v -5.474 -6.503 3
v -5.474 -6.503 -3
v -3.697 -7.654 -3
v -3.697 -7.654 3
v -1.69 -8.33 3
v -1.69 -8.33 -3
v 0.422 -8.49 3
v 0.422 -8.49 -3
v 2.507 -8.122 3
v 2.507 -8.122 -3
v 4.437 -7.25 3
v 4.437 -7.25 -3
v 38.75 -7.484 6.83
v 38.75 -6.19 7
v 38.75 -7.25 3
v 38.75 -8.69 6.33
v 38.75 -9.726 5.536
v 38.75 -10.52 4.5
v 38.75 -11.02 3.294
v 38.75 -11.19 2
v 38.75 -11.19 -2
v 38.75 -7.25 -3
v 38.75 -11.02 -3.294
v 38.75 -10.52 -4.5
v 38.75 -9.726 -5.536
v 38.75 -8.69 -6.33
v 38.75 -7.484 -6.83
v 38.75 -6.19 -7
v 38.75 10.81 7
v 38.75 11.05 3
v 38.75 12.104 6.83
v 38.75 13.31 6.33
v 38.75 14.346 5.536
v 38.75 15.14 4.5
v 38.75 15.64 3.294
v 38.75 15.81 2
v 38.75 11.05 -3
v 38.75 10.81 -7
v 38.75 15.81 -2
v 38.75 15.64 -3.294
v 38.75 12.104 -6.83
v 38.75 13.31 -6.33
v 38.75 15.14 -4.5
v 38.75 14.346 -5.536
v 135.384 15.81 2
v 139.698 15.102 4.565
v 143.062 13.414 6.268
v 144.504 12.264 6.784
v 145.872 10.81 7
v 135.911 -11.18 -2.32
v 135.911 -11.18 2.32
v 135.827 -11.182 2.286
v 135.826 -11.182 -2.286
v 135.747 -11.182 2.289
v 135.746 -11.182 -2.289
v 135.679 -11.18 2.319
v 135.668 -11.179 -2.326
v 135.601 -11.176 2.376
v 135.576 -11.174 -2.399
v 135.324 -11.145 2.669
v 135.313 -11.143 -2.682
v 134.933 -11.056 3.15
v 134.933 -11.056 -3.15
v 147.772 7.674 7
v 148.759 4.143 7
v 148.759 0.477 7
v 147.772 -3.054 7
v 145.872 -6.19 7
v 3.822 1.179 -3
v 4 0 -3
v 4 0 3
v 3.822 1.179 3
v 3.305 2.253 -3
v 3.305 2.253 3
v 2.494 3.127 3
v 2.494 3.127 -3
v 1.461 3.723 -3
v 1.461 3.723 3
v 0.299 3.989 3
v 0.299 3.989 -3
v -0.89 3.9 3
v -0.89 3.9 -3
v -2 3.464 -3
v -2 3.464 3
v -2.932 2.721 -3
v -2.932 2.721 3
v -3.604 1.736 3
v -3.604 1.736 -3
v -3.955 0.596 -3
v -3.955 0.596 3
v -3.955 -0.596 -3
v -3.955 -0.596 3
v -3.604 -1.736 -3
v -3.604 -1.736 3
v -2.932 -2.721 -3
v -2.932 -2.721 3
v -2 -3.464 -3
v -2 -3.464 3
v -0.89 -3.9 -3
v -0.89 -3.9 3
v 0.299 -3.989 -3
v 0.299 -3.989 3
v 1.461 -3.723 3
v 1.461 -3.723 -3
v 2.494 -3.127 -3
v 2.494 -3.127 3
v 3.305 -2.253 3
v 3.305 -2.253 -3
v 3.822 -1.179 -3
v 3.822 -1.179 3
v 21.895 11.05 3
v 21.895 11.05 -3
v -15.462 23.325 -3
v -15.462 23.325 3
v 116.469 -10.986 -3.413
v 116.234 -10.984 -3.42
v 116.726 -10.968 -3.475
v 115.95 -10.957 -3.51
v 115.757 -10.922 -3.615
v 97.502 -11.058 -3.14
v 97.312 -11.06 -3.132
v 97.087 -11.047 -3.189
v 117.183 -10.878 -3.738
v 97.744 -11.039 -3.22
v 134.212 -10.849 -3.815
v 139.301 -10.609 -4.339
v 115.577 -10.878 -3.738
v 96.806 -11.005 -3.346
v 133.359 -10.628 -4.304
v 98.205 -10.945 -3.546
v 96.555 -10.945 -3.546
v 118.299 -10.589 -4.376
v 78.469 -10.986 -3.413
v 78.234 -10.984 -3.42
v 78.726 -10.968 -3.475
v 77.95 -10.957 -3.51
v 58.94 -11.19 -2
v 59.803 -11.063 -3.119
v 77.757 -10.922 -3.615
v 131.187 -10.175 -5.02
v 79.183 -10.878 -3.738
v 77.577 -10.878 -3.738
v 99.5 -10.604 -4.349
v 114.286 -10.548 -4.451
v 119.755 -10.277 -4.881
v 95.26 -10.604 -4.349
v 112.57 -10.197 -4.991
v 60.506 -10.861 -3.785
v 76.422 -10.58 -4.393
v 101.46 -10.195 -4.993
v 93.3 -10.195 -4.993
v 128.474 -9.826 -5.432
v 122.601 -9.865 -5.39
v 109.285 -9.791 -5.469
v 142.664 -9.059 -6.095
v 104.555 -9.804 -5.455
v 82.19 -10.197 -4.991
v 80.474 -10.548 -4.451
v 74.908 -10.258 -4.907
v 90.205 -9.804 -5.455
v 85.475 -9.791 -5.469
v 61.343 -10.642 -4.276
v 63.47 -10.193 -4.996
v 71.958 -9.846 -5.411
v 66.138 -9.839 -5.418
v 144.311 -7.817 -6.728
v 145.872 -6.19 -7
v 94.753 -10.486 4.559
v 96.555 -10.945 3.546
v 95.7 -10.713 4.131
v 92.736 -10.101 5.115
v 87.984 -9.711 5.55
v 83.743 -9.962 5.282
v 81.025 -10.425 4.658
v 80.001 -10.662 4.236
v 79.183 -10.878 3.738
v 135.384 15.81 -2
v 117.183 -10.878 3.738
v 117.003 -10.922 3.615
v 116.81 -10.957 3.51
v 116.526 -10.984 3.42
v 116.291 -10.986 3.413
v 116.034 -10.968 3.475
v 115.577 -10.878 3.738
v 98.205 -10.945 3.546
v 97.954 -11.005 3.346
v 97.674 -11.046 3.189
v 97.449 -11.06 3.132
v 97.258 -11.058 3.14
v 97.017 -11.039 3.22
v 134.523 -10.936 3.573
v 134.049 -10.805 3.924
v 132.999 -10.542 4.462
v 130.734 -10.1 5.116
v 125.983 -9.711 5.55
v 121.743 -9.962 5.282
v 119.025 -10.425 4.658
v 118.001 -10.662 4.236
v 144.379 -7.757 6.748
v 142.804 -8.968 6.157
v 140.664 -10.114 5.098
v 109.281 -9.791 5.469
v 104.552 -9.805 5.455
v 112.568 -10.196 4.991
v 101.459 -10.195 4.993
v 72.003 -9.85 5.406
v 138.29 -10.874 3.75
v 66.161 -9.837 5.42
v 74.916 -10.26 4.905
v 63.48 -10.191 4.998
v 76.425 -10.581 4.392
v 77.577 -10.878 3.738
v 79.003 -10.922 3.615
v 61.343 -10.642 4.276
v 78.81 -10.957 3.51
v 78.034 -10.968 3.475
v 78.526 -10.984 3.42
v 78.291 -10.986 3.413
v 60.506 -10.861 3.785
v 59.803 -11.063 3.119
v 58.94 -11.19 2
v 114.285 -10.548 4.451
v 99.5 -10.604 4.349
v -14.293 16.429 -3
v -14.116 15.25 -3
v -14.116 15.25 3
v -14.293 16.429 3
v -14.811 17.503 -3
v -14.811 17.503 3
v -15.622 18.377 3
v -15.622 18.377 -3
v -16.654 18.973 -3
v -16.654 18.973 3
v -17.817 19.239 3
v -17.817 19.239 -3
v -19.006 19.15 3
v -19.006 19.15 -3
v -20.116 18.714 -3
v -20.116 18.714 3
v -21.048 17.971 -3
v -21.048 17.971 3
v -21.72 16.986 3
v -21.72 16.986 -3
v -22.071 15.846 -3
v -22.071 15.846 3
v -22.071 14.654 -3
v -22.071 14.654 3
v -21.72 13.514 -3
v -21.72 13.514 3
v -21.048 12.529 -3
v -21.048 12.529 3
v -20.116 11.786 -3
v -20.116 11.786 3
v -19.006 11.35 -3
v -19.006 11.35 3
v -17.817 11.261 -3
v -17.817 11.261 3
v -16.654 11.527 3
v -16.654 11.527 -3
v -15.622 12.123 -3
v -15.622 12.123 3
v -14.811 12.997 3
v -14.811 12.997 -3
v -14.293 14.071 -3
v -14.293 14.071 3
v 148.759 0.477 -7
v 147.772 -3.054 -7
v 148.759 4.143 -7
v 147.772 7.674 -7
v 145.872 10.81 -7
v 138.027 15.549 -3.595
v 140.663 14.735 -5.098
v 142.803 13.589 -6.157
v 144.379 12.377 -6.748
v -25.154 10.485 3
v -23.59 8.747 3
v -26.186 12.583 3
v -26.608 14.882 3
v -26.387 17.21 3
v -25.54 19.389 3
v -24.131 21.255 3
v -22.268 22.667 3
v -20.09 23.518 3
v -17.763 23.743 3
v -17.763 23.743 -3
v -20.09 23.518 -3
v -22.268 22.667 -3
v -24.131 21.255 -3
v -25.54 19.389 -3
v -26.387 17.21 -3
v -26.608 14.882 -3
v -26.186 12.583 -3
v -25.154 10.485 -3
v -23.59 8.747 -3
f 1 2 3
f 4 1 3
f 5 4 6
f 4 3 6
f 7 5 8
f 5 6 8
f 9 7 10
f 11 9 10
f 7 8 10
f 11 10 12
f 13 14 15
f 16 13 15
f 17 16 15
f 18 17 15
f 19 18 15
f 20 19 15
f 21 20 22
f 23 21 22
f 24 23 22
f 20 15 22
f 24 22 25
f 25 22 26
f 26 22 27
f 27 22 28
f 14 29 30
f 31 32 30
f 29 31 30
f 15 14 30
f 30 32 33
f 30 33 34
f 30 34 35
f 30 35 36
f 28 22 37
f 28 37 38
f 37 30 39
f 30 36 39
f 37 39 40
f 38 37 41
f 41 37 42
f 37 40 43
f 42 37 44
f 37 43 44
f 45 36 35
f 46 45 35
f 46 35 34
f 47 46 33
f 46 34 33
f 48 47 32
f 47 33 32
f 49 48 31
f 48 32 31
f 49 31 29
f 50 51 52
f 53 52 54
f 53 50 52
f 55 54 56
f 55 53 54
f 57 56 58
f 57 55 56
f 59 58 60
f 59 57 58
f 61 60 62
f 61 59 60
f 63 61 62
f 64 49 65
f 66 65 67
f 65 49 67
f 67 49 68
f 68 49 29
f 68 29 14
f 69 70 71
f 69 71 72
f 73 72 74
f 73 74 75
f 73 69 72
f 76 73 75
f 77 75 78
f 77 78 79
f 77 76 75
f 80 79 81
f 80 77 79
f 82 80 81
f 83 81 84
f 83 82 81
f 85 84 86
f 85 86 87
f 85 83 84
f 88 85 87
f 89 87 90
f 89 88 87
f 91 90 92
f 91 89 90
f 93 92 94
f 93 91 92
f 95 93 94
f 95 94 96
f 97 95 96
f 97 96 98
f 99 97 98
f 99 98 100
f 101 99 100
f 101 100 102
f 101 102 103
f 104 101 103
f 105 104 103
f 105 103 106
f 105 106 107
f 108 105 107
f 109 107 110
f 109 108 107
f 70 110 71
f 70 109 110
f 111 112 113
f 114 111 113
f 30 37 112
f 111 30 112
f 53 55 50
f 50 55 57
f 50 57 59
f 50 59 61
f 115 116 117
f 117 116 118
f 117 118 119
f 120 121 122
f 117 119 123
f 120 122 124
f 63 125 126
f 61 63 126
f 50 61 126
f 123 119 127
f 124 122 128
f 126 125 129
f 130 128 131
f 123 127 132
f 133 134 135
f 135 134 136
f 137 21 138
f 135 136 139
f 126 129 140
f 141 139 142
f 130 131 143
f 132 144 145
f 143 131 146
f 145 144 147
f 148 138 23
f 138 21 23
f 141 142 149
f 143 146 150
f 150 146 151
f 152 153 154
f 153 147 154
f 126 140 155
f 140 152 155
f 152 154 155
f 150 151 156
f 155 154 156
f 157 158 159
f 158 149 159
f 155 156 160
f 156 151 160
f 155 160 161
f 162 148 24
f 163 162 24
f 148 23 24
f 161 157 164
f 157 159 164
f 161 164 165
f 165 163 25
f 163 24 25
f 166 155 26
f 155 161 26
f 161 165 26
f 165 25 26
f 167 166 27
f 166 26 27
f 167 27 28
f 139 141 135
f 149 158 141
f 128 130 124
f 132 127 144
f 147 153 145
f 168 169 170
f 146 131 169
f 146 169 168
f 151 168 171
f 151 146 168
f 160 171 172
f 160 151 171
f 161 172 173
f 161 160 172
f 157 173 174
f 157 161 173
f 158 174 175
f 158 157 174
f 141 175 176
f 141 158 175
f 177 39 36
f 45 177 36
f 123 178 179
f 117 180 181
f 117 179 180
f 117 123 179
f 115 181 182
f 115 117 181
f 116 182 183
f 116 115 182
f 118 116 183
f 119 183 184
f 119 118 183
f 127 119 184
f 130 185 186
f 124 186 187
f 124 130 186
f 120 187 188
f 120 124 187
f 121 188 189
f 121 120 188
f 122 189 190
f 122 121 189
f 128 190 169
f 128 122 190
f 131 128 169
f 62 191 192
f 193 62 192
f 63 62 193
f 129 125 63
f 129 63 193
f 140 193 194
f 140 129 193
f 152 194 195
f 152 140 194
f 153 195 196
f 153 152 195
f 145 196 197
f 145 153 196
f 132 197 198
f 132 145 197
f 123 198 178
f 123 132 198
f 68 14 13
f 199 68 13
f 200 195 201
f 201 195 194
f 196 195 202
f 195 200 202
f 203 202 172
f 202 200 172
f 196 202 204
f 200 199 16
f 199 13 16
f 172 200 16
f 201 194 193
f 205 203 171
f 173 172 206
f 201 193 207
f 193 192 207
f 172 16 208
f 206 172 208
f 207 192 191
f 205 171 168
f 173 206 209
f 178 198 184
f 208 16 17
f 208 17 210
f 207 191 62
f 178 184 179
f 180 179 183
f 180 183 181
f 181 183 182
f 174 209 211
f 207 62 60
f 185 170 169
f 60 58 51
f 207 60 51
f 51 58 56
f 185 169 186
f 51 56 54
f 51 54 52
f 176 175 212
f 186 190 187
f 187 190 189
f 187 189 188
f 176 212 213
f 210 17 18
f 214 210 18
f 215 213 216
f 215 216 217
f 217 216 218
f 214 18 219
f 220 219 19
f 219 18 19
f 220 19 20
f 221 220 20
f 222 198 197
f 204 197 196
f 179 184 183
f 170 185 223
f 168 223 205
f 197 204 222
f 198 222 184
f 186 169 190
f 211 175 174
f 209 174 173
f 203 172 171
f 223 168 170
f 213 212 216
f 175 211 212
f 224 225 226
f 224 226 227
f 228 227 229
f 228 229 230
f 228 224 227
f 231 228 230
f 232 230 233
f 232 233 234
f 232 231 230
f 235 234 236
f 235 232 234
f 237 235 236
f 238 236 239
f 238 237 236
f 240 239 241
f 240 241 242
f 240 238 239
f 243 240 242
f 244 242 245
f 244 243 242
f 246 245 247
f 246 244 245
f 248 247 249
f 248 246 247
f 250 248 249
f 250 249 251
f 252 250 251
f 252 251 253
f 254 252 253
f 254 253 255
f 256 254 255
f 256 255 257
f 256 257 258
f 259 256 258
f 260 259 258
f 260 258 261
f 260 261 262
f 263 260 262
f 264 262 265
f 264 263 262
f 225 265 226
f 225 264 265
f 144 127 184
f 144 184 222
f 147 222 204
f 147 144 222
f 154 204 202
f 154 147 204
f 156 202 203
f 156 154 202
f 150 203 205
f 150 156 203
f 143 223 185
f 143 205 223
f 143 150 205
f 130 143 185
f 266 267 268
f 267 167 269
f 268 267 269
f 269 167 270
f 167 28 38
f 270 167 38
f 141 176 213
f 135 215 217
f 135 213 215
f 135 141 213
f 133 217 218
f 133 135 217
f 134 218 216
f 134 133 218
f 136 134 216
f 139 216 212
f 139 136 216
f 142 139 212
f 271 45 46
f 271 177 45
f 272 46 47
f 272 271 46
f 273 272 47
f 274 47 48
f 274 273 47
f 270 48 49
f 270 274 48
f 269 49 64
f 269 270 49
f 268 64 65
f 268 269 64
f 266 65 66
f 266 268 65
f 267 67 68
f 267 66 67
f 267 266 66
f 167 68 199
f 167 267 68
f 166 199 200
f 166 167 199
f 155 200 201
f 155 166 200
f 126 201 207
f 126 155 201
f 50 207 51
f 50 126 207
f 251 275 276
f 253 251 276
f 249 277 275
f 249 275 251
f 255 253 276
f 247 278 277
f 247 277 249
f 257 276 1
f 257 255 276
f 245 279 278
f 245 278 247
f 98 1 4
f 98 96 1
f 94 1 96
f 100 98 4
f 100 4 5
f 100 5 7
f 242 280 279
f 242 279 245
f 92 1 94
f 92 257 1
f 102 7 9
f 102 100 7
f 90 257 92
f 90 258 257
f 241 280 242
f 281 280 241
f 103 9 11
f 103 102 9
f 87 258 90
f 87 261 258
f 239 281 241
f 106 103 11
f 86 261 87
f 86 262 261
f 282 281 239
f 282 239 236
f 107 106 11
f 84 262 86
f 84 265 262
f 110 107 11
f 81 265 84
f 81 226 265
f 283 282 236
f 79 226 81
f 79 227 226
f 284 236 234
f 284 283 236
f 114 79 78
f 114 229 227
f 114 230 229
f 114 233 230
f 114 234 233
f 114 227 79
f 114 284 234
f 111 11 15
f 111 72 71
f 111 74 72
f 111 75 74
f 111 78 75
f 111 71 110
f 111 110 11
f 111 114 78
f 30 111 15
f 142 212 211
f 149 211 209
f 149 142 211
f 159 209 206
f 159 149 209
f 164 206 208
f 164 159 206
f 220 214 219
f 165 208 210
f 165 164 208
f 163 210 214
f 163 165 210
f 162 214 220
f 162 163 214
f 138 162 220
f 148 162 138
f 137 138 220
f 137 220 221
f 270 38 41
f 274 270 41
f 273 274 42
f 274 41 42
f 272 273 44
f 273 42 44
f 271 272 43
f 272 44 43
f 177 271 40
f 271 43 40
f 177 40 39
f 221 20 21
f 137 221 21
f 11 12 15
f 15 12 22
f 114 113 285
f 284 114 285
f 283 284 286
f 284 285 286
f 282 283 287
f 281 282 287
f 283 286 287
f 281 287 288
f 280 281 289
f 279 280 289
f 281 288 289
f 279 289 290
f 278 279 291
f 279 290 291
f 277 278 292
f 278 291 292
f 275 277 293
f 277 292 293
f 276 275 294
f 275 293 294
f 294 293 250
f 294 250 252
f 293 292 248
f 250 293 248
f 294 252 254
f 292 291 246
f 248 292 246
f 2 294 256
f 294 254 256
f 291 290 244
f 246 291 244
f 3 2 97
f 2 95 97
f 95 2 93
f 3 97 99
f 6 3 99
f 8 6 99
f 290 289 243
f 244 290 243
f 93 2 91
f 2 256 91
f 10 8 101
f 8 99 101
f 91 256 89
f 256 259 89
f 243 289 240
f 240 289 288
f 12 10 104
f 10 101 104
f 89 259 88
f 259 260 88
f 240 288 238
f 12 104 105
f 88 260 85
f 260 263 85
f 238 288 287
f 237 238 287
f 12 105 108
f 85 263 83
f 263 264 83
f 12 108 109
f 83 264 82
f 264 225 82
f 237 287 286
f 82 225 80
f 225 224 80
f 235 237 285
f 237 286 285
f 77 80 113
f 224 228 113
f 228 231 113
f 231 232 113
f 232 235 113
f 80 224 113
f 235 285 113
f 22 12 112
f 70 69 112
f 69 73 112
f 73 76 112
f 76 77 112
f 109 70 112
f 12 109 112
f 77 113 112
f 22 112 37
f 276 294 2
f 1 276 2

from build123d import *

# Parameters (mm, degrees)
EXTRUDE_1_DEPTH          = 3
EXTRUDE_1_DEPTH_BACK     = 3
SKETCH_1_R               = 4
EXTRUDE_2_DEPTH          = 110.134
CUT_EXTRUDE_1_DEPTH      = 7
CUT_EXTRUDE_1_DEPTH_BACK = 7


with BuildPart() as part:
    # 草图1 → 凸台-拉伸1 (new, two sides: drawn at the far end of the back side and taken through both)
    with BuildSketch(Plane.XY.offset(-EXTRUDE_1_DEPTH_BACK)):
        with BuildLine():
            Line((-23.589809211, 8.747299509), (-5.474019211, -6.502700491))
            ThreePointArc((-5.474019211, -6.502700491), (-0.63908945, -8.475940342), (4.437059837, -7.25))
            Line((4.437059837, -7.25), (38.75, -7.25))
            Line((38.75, -7.25), (38.75, 11.05))
            Line((38.75, 11.05), (21.8949318, 11.05))
            Line((21.8949318, 11.05), (-15.462352545, 23.325225673))
            ThreePointArc((-15.462352545, 23.325225673), (-25.539933262, 19.389093721), (-23.589809211, 8.747299509))
        make_face()
        Circle(SKETCH_1_R, mode=Mode.SUBTRACT)
        with Locations((-18.11579, 15.25)):
            Circle(SKETCH_1_R, mode=Mode.SUBTRACT)
    extrude(amount=EXTRUDE_1_DEPTH + EXTRUDE_1_DEPTH_BACK)

    # 草图2 → 凸台-拉伸2 (add)
    with BuildSketch(Plane(origin=(38.75, 0, 0), x_dir=(0, 0, -1), z_dir=(1, 0, 0))):
        with BuildLine():
            Line((-7, 10.81), (-7, -6.19))
            ThreePointArc((-7, -6.19), (-5.535533906, -9.725533906), (-2, -11.19))
            Line((-2, -11.19), (2, -11.19))
            ThreePointArc((2, -11.19), (5.535533906, -9.725533906), (7, -6.19))
            Line((7, -6.19), (7, 10.81))
            ThreePointArc((7, 10.81), (5.535533906, 14.345533906), (2, 15.81))
            Line((2, 15.81), (-2, 15.81))
            ThreePointArc((-2, 15.81), (-5.535533906, 14.345533906), (-7, 10.81))
        make_face()
    extrude(amount=EXTRUDE_2_DEPTH)

    # 草图3 → 切除-拉伸1 (cut, two sides: drawn at the far end of the back side and taken through both)
    with BuildSketch(Plane.XY.offset(-CUT_EXTRUDE_1_DEPTH_BACK)):
        with BuildLine():
            Line((38.75, 15.81), (135.384, 15.81))
            ThreePointArc((135.384, 15.81), (148.881430926, 2.573359834), (135.910619432, -11.179724681))
            ThreePointArc((135.910619432, -11.179724681), (135.416543333, -11.158219373), (134.932713501, -11.055835964))
            ThreePointArc((134.932713501, -11.055835964), (126.070501893, -9.711605063), (117.183142857, -10.878052953))
            ThreePointArc((117.183142857, -10.878052953), (116.38, -10.987557918), (115.576857143, -10.878052953))
            ThreePointArc((115.576857143, -10.878052953), (106.886506673, -9.710238292), (98.205428571, -10.945092687))
            ThreePointArc((98.205428571, -10.945092687), (97.379999908, -11.060882627), (96.554571252, -10.945092637))
            ThreePointArc((96.554571252, -10.945092637), (87.873493235, -9.710238291), (79.183142857, -10.878052953))
            ThreePointArc((79.183142857, -10.878052953), (78.38, -10.987557918), (77.576857143, -10.878052953))
            ThreePointArc((77.576857143, -10.878052953), (68.676784071, -9.711734935), (59.802929496, -11.063142857))
            ThreePointArc((59.802929496, -11.063142857), (59.375984144, -11.158116286), (58.939766636, -11.19))
            Line((58.939766636, -11.19), (38.75, -11.19))
            Line((38.75, -11.19), (38.75, -16.19))
            Line((38.75, -16.19), (153.884, -16.19))
            Line((153.884, -16.19), (153.884, 20.81))
            Line((153.884, 20.81), (38.75, 20.81))
            Line((38.75, 20.81), (38.75, 15.81))
        make_face()
    extrude(amount=CUT_EXTRUDE_1_DEPTH + CUT_EXTRUDE_1_DEPTH_BACK, mode=Mode.SUBTRACT)


solid = part.part
